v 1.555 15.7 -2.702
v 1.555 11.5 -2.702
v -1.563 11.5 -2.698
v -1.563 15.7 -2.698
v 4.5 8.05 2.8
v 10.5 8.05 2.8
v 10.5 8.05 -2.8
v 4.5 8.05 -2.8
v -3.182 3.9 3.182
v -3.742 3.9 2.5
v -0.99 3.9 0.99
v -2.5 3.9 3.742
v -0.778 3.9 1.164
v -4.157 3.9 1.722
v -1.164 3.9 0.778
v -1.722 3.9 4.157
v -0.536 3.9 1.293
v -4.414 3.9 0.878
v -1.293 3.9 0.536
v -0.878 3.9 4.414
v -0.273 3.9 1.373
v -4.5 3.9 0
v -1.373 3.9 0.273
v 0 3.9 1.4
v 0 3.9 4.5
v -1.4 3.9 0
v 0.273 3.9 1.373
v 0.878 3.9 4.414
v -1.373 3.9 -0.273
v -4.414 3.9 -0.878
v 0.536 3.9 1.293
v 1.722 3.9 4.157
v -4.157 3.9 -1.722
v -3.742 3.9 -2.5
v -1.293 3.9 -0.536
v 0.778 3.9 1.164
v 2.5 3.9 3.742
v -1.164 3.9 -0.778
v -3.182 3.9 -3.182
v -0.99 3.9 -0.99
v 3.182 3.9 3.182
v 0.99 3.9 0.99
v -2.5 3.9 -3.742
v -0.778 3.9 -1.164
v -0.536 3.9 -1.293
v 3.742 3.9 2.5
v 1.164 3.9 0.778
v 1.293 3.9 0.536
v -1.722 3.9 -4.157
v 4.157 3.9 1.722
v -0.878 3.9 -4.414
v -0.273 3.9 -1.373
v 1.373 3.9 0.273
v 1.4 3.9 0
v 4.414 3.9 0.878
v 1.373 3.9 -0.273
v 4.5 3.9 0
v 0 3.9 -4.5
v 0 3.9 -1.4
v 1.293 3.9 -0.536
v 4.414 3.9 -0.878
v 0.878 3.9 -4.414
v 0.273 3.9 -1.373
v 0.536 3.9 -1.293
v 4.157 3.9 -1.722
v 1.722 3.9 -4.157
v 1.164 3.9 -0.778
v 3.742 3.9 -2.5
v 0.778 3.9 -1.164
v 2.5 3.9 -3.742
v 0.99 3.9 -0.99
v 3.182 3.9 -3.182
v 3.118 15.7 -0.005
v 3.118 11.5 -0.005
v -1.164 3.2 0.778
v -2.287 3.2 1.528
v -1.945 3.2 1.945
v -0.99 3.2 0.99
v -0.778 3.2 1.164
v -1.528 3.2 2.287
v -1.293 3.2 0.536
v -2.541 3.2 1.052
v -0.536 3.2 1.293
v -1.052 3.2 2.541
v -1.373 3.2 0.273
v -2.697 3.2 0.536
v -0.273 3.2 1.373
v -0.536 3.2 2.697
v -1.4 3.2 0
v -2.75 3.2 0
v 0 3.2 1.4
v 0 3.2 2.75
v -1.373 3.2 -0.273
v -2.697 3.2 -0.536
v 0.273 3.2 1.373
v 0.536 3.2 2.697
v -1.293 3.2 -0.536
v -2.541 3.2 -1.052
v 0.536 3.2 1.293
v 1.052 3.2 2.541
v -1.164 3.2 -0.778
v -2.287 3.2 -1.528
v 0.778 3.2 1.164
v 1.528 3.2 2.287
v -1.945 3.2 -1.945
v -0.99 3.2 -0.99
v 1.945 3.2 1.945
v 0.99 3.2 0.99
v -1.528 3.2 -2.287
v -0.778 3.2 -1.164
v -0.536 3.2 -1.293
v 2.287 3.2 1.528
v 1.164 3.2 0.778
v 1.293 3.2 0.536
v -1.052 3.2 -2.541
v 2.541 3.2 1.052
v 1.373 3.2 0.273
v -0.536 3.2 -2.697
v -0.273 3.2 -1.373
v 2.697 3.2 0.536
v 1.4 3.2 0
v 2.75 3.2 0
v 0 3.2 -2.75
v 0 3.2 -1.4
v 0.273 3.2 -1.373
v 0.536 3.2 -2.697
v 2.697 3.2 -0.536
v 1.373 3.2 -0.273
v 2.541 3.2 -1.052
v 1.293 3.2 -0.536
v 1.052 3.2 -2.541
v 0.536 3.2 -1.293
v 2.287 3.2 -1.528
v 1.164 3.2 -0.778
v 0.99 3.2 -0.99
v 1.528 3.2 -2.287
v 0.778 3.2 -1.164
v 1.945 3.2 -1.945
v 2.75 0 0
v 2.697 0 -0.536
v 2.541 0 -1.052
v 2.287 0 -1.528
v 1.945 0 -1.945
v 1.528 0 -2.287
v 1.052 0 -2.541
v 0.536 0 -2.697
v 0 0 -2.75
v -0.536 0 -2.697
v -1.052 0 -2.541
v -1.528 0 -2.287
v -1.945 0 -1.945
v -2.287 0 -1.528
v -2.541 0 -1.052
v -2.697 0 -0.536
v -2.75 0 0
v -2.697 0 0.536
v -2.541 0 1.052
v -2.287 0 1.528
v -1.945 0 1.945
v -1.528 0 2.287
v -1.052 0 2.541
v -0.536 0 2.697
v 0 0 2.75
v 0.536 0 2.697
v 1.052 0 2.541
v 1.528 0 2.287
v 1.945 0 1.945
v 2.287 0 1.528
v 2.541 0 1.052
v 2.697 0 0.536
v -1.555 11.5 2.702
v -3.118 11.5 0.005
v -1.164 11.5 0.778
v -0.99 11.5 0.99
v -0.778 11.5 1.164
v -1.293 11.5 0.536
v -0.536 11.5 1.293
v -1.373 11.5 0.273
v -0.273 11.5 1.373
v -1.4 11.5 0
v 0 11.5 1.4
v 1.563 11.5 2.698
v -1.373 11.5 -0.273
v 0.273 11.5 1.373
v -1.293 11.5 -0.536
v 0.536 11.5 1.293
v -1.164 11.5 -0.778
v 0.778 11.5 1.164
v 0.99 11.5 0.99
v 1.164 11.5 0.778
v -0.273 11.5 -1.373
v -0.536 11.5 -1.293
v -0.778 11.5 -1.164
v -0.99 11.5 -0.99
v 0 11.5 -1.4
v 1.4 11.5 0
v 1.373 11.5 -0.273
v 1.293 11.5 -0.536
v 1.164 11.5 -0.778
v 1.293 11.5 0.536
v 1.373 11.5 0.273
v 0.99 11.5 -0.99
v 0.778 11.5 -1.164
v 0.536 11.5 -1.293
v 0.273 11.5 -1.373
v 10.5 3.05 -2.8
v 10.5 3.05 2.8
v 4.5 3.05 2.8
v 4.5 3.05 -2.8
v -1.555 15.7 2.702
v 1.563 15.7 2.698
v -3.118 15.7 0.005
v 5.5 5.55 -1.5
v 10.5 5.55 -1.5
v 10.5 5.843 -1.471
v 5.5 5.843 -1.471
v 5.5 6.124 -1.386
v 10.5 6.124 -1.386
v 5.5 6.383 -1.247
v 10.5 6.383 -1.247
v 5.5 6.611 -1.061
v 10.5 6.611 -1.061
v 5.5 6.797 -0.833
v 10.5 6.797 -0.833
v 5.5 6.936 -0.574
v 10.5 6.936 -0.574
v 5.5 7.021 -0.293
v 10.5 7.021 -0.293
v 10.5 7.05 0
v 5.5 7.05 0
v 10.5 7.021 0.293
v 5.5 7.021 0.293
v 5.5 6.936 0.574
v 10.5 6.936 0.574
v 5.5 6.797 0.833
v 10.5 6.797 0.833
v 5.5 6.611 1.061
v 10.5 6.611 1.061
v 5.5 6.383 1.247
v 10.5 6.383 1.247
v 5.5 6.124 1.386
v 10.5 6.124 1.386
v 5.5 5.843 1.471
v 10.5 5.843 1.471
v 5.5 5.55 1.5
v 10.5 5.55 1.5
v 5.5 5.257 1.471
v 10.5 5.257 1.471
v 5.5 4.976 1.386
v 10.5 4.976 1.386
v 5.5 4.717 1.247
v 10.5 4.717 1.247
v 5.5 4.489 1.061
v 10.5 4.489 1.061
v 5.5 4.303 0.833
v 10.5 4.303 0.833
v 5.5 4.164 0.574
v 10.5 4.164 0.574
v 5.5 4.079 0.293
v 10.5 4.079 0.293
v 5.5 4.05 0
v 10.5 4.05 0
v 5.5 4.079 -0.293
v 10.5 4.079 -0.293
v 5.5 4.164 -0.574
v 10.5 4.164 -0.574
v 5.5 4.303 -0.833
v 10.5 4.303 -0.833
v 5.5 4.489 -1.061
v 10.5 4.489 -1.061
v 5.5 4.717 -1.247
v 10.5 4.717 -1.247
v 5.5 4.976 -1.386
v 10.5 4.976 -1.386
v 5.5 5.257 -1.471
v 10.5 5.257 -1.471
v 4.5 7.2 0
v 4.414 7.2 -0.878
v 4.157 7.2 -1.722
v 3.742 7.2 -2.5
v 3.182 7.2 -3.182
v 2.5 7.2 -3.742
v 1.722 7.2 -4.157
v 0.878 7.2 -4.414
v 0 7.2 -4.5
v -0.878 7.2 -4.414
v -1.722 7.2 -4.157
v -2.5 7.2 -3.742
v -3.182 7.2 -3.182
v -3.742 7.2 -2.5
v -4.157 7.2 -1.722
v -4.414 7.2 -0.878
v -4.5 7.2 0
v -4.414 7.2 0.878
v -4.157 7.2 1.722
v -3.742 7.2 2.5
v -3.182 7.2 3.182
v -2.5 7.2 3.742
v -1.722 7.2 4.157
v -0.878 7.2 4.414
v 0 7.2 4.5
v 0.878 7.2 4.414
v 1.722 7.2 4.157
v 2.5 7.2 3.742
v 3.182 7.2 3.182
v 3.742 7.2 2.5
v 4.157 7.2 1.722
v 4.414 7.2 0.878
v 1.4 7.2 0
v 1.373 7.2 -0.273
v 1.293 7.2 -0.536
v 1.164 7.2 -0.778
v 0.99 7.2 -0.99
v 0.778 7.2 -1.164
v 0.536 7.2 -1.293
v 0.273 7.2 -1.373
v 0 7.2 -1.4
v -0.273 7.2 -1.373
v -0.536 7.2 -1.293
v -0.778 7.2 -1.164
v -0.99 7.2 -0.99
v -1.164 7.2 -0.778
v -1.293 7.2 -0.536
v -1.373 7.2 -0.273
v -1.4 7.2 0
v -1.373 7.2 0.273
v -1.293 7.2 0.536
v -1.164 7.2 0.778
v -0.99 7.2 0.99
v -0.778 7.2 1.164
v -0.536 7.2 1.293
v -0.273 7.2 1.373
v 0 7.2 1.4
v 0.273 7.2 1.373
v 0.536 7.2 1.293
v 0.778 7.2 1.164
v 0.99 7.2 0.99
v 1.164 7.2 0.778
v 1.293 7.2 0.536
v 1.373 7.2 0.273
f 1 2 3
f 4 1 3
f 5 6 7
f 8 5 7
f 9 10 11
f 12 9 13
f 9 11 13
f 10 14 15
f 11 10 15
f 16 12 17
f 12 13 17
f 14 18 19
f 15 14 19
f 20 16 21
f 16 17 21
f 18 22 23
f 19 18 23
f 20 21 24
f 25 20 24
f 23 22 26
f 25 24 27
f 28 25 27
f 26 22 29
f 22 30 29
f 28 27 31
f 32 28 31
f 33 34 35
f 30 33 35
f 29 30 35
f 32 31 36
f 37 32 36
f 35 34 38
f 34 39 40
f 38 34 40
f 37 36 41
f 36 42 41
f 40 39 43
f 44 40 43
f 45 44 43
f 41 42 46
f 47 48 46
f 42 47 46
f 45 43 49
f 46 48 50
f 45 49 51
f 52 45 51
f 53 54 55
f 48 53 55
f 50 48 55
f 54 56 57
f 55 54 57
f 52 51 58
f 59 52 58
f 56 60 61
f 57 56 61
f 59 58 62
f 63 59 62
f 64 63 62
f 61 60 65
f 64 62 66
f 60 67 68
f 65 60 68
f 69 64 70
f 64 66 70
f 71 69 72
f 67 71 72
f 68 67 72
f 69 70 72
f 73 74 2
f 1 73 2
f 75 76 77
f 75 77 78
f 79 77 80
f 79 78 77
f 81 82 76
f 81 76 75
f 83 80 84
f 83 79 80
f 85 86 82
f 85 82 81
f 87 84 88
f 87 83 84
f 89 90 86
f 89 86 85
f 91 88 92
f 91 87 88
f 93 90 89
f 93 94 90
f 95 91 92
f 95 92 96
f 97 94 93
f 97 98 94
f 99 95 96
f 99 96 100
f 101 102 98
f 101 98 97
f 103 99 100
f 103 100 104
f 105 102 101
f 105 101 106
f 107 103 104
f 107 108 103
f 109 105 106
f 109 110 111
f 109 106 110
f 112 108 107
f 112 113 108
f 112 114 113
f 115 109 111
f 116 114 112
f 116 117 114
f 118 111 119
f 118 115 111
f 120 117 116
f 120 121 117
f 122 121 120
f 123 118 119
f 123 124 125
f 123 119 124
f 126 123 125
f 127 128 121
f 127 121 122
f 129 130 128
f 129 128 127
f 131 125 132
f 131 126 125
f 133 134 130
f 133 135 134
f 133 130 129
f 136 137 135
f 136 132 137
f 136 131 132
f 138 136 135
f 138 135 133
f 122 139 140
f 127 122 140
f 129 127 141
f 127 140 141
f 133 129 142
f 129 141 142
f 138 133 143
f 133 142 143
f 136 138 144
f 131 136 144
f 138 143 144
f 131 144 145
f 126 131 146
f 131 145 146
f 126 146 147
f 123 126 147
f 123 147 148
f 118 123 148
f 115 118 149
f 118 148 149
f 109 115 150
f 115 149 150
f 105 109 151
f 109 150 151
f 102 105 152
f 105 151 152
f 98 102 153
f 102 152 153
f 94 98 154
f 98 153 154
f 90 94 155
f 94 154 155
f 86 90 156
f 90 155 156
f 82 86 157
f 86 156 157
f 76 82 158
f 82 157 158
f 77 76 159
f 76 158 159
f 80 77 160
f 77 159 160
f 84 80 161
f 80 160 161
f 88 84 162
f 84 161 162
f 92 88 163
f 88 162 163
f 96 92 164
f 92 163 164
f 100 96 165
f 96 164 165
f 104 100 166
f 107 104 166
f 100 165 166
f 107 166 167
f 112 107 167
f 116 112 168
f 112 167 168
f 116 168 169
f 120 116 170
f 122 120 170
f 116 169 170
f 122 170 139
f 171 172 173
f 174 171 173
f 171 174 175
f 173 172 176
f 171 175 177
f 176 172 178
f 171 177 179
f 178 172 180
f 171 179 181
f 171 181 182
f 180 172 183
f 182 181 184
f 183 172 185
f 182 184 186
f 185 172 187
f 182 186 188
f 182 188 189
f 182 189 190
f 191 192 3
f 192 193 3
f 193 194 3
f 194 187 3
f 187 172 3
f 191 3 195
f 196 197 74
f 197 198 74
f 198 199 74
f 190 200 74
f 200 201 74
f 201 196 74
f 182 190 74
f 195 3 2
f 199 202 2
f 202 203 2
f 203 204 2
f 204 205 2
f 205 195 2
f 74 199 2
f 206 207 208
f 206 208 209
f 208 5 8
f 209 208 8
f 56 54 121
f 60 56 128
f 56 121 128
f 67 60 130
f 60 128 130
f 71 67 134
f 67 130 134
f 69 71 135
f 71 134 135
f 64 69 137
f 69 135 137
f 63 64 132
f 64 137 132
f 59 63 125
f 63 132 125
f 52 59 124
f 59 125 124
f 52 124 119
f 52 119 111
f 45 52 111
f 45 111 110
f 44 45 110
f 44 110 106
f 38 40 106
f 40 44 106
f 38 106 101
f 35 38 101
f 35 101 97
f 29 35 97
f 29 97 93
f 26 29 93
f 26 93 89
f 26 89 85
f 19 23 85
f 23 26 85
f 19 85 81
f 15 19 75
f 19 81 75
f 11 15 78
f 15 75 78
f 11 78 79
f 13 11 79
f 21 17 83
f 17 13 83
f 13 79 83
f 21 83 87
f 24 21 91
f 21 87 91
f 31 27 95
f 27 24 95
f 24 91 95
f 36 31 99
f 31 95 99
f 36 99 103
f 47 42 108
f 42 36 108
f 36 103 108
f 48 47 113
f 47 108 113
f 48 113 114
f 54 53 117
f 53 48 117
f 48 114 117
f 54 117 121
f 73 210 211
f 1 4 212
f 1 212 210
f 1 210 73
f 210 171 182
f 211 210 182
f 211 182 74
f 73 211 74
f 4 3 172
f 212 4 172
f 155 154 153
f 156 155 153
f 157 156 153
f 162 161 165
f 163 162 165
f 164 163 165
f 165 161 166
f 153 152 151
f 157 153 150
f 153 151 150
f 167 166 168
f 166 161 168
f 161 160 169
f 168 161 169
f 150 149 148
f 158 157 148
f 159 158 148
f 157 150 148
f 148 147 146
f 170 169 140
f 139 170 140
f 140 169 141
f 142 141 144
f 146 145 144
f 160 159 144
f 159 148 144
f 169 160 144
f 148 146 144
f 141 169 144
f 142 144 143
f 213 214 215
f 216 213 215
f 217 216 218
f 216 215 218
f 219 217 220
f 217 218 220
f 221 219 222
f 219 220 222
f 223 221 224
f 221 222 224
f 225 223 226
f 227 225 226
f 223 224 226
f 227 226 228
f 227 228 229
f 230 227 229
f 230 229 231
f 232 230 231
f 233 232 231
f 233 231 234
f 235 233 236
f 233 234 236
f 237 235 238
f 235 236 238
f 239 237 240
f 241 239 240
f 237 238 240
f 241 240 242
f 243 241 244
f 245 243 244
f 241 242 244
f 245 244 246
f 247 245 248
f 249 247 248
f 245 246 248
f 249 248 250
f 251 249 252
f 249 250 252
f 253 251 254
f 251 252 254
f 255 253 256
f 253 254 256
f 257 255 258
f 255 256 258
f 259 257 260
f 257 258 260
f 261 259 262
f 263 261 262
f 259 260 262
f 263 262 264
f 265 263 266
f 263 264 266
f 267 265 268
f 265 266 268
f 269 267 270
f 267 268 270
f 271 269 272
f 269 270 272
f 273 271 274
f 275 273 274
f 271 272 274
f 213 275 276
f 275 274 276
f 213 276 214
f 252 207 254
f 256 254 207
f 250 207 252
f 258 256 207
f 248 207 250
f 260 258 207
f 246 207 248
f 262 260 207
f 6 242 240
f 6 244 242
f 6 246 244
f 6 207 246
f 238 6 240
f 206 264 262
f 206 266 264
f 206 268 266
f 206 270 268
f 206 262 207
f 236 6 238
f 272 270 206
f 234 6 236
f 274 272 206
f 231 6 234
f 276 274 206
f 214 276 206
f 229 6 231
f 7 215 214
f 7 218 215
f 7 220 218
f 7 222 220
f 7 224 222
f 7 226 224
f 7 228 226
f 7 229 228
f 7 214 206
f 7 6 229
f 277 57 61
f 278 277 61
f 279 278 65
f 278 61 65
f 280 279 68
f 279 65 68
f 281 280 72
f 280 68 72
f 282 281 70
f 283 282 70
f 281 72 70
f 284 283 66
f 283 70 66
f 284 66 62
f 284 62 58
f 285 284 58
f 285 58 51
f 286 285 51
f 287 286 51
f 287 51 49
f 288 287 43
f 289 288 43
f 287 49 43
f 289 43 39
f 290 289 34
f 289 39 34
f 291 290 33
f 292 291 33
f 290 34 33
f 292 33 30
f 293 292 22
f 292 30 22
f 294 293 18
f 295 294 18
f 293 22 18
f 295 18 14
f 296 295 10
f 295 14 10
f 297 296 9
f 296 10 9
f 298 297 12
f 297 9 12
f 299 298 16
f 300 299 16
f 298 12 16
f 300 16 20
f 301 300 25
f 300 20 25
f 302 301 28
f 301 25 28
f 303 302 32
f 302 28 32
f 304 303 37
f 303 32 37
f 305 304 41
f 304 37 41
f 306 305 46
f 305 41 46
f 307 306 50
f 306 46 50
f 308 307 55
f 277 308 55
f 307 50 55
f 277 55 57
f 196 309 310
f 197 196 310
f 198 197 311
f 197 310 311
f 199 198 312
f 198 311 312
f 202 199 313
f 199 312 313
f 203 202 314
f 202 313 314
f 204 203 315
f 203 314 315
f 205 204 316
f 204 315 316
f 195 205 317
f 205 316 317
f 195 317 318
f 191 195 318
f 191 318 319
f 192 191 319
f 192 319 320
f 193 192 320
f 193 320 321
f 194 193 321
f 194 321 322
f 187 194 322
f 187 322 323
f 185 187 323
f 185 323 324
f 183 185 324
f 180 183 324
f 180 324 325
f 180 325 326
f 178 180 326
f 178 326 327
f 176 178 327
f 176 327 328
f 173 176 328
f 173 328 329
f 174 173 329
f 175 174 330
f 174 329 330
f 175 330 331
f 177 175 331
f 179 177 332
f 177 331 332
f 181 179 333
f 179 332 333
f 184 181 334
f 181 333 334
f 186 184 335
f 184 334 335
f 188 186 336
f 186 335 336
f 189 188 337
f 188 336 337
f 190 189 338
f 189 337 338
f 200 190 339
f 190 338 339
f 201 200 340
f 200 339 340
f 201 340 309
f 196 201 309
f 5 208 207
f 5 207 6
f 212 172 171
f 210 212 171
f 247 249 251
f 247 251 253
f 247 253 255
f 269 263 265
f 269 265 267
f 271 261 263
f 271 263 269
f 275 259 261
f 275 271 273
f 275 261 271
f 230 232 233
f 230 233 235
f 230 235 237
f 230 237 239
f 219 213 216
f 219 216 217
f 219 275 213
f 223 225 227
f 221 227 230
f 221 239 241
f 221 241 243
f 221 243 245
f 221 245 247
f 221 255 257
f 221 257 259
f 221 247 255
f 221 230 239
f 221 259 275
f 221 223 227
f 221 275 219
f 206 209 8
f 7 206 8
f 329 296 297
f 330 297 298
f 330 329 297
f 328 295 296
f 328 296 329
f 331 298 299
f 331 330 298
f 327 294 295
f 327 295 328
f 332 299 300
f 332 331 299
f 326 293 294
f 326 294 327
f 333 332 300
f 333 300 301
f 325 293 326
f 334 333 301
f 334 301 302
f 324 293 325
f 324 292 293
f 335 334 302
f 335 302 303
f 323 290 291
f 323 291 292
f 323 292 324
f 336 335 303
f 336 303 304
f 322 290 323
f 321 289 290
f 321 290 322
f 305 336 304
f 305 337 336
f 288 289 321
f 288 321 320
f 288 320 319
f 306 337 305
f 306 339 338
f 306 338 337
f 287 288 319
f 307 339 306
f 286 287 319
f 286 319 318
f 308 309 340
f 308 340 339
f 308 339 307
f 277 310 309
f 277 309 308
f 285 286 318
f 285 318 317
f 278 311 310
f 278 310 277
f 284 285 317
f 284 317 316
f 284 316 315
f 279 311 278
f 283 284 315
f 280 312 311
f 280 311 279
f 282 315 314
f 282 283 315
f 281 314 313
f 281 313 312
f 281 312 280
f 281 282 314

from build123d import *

# Parameters (mm, degrees)
SKETCH1_R           = 2.75
BOSS_EXTRUDE1_DEPTH = 3.2
SKETCH2_R           = 1.4
BOSS_EXTRUDE2_DEPTH = 8.3
BOSS_EXTRUDE3_DEPTH = 4.2
SKETCH6_R           = 4.5
BOSS_EXTRUDE5_DEPTH = 3.3
SKETCH7_W           = 5.6
SKETCH7_H           = 5
BOSS_EXTRUDE6_DEPTH = 6
SKETCH8_R           = 1.5
CUT_EXTRUDE1_DEPTH  = 5


with BuildPart() as part:
    # Sketch1 → Boss-Extrude1 (new body)
    with BuildSketch(Plane(origin=(0, 0, 0), x_dir=(1, 0, 0), z_dir=(0, 1, 0))):
        Circle(SKETCH1_R)
    extrude(amount=BOSS_EXTRUDE1_DEPTH)

    # Sketch2 → Boss-Extrude2 (add)
    with BuildSketch(Plane(origin=(0, 3.2, 0), x_dir=(1, 0, 0), z_dir=(0, 1, 0))):
        Circle(SKETCH2_R)
    extrude(amount=BOSS_EXTRUDE2_DEPTH)

    # Sketch3 → Boss-Extrude3 (add)
    with BuildSketch(Plane(origin=(0, 11.5, 0), x_dir=(1, 0, 0), z_dir=(0, 1, 0))):
        Polygon((1.554649618, 2.702418281), (-1.563038074, 2.697575204), (-3.117687692, -0.004843077), (-1.554649618, -2.702418281), (1.563038074, -2.697575204), (3.117687692, 0.004843077), align=None)
    extrude(amount=BOSS_EXTRUDE3_DEPTH)

    # Sketch6 → Boss-Extrude5 (add)
    with BuildSketch(Plane(origin=(0, 3.9, 0), x_dir=(1, 0, 0), z_dir=(0, 1, 0))):
        Circle(SKETCH6_R)
    extrude(amount=BOSS_EXTRUDE5_DEPTH)


with BuildPart() as body_2:
    # Sketch7 → Boss-Extrude6 (new body)
    with BuildSketch(Plane(origin=(4.5, 0, 0), x_dir=(0, 0, -1), z_dir=(1, 0, 0))):
        with Locations((0, 5.55)):
            Rectangle(SKETCH7_W, SKETCH7_H)
    extrude(amount=BOSS_EXTRUDE6_DEPTH)

    # Sketch8 → Cut-Extrude1 (cut)
    with BuildSketch(Plane(origin=(10.5, 0, 0), x_dir=(0, 0, -1), z_dir=(1, 0, 0))):
        with Locations((0, 5.55)):
            Circle(SKETCH8_R)
    extrude(amount=-CUT_EXTRUDE1_DEPTH, mode=Mode.SUBTRACT)


solid = Compound([part.part, body_2.part])
